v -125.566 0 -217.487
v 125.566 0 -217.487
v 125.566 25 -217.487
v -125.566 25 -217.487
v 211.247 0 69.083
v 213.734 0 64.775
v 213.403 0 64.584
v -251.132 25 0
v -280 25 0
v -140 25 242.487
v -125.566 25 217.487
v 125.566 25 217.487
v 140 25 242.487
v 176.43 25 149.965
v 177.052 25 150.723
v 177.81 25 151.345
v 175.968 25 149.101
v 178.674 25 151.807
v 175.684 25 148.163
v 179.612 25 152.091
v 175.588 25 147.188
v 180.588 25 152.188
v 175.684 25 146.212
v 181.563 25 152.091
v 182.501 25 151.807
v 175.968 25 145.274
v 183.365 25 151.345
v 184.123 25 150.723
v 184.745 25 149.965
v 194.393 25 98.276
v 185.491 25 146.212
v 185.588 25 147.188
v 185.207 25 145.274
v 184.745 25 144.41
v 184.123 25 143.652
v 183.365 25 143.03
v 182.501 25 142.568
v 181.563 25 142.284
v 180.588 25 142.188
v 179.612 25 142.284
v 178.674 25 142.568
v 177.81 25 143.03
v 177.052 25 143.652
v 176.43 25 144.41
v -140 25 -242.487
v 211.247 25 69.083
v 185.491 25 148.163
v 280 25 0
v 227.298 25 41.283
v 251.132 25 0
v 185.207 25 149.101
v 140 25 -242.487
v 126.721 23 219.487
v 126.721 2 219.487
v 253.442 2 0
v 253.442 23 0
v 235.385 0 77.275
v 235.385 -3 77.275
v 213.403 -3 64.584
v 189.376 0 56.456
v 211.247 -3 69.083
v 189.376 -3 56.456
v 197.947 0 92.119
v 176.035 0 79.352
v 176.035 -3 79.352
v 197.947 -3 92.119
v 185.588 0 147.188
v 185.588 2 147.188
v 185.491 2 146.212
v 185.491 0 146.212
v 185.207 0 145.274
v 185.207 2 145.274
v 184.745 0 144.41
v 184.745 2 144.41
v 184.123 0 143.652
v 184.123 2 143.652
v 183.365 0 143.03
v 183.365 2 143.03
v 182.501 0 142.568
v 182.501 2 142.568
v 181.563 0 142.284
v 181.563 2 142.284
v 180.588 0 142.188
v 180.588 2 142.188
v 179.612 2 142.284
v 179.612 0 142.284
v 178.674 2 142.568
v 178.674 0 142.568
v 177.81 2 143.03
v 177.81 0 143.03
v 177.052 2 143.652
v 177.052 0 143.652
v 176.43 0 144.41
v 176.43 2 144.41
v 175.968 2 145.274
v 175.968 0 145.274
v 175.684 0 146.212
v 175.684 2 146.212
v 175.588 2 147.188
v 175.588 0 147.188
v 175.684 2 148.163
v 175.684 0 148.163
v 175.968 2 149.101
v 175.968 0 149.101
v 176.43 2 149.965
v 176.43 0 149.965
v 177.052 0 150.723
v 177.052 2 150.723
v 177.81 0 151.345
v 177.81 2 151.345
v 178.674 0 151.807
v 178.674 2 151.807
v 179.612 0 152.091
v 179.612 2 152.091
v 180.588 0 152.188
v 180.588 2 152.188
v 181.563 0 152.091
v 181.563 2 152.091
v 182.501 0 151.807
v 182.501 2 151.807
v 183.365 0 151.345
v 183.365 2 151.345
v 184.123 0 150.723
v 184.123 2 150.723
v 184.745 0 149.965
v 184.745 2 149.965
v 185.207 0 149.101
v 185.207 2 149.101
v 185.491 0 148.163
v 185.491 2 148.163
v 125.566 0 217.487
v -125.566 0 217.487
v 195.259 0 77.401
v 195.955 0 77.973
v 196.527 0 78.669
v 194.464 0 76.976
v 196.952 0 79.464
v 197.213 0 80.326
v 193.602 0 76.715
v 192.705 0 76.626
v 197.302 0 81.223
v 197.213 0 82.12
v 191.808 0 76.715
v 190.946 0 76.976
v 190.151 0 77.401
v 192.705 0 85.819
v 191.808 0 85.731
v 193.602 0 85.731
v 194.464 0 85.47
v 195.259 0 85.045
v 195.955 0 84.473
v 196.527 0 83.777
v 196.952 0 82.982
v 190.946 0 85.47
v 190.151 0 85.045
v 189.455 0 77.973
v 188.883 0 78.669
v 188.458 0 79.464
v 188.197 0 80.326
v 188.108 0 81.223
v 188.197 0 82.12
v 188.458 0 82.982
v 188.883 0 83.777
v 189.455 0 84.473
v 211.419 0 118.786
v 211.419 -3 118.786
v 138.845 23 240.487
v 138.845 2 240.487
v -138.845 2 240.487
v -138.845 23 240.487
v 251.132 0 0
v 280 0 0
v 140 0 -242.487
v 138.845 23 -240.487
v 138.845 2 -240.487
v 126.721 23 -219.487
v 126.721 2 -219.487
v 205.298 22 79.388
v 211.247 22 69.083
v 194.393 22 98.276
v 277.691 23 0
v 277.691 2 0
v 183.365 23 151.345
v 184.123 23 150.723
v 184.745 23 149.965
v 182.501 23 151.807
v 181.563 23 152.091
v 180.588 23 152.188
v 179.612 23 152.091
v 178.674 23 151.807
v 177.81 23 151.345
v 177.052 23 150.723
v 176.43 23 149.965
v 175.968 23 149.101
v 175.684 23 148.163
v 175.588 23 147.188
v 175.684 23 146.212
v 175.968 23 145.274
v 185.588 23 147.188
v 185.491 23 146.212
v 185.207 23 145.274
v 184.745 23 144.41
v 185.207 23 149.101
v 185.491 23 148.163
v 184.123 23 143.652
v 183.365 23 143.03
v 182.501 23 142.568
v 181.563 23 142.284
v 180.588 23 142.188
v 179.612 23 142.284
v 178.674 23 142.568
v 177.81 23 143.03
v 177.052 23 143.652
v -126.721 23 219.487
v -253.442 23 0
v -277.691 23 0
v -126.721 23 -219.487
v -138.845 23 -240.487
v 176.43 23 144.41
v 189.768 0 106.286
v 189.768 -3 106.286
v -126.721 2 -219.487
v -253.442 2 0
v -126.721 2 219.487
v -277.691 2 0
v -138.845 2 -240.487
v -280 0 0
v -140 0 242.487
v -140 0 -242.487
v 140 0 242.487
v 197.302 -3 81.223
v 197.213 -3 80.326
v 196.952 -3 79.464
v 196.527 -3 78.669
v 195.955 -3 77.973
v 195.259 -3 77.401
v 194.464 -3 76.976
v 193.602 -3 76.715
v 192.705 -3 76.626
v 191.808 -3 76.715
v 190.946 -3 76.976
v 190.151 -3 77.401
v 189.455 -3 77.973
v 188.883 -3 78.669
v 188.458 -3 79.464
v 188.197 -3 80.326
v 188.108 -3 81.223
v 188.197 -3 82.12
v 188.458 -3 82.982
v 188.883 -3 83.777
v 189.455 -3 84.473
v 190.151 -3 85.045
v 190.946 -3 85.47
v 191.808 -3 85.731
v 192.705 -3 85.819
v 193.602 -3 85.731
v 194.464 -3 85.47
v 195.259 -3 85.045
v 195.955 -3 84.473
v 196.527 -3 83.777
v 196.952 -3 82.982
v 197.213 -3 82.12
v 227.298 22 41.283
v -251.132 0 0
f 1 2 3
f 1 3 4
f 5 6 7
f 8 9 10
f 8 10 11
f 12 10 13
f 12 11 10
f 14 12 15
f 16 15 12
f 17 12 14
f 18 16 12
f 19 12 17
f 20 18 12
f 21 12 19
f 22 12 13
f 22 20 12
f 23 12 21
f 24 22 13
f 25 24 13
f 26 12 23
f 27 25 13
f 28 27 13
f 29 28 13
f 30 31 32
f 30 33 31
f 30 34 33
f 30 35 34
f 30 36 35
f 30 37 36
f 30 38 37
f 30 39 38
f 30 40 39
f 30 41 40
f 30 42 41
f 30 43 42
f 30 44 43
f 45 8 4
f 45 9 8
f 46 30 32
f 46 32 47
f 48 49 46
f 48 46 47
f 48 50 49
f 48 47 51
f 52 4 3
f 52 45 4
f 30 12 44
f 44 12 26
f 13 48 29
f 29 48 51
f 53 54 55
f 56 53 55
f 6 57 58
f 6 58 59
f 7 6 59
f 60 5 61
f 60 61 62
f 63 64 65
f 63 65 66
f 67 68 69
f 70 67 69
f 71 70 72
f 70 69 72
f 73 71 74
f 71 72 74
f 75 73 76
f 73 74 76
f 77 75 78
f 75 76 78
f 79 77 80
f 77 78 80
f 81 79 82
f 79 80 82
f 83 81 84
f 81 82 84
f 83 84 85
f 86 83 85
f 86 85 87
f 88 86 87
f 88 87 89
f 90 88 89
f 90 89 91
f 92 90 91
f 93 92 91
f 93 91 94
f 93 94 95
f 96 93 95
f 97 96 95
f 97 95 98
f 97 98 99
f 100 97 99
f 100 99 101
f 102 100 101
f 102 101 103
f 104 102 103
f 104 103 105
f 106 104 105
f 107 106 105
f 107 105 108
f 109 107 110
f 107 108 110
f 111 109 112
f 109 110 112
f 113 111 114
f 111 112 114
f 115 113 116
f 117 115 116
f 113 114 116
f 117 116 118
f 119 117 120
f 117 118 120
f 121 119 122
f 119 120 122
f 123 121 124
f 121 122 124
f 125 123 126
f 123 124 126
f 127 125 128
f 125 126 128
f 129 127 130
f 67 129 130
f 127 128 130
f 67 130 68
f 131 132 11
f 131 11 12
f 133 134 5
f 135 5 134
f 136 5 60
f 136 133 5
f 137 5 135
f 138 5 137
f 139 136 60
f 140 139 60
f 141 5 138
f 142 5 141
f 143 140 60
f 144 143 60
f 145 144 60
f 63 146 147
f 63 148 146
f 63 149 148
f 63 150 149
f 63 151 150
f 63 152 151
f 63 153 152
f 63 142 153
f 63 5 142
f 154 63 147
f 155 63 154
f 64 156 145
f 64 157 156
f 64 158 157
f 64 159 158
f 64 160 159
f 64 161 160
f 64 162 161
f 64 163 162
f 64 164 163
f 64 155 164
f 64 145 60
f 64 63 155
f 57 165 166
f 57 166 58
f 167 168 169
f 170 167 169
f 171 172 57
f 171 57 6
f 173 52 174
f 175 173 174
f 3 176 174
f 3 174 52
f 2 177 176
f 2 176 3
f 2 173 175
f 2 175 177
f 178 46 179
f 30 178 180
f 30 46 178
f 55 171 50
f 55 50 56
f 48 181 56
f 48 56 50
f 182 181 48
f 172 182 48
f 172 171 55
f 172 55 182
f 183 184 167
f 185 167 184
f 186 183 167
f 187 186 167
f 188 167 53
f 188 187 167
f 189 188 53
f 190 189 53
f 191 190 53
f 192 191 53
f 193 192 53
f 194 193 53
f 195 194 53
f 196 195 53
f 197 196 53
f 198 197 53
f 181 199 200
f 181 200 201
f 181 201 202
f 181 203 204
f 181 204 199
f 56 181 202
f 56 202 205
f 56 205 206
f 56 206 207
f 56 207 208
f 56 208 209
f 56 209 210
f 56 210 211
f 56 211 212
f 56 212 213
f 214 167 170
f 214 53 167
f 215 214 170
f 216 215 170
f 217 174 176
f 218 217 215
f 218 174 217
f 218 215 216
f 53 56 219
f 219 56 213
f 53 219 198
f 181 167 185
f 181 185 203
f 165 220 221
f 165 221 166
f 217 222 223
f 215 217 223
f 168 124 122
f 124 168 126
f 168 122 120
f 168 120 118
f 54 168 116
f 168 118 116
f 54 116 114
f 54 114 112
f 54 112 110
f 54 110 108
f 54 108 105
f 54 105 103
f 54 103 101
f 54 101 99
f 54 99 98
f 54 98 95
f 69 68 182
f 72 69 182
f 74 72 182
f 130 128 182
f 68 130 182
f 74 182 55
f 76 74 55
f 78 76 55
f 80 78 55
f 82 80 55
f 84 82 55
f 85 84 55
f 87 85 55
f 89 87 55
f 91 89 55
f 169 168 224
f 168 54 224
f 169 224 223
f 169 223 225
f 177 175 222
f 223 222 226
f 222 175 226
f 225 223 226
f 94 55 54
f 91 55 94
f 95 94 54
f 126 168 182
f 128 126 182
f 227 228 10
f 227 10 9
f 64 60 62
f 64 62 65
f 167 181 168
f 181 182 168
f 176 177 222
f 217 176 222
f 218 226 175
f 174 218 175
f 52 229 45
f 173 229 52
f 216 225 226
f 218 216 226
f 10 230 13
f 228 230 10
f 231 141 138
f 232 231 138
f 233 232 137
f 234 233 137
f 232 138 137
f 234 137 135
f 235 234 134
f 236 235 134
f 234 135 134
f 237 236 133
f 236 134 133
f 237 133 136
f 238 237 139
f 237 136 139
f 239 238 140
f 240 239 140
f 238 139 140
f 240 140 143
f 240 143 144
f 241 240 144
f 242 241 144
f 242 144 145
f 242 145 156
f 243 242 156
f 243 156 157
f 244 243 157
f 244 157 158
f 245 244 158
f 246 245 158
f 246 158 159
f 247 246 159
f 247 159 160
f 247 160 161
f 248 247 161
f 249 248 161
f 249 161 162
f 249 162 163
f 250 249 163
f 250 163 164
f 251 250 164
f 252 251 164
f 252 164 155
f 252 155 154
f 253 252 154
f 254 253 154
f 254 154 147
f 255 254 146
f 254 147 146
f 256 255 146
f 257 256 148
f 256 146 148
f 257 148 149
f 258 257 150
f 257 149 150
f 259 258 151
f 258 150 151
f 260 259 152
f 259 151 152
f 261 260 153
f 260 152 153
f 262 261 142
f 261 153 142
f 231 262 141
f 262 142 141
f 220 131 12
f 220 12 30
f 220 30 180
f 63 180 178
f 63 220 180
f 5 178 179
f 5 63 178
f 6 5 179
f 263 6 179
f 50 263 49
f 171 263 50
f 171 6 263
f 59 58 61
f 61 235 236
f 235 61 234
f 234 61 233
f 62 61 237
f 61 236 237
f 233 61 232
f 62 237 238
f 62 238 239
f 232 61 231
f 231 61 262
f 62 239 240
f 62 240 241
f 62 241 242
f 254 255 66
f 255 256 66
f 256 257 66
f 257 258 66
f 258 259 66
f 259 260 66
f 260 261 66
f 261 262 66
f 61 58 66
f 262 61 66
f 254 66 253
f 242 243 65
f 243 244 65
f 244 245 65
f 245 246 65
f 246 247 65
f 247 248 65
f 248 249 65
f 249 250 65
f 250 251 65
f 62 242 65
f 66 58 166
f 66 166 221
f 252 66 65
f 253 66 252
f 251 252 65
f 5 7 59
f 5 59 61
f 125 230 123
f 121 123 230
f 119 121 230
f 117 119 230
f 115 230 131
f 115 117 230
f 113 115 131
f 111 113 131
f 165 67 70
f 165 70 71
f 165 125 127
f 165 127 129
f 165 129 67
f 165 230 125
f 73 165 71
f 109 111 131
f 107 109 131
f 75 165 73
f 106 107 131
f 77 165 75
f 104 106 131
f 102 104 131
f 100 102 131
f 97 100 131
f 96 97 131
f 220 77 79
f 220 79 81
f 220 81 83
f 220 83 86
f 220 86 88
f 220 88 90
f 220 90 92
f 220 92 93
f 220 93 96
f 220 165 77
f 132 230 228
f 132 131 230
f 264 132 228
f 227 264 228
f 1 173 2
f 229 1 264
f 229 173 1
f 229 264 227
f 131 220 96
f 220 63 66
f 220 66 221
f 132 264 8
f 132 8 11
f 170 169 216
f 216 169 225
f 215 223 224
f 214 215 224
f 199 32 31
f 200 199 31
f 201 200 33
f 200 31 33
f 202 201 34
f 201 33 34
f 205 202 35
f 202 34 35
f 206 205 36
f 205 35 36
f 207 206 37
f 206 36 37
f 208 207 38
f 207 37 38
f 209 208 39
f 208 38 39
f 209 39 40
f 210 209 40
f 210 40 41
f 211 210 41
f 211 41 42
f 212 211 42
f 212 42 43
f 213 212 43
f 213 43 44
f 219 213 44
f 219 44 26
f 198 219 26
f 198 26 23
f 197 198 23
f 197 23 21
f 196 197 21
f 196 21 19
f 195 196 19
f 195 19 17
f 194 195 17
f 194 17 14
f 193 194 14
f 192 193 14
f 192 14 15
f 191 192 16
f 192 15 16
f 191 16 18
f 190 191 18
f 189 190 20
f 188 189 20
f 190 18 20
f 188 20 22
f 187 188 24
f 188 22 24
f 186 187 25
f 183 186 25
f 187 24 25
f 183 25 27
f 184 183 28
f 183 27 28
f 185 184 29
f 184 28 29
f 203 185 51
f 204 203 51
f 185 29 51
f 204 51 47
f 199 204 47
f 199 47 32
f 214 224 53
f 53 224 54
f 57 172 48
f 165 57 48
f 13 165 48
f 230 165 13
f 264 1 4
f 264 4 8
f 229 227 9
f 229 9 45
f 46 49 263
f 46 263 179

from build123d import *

# Parameters (mm, degrees)
BOSS_EXTRUDE1_DEPTH = 25
SHELL1_T            = -2
SKETCH4_R           = 5
CUT_EXTRUDE2_DEPTH  = 40
SKETCH5_R           = 5.211475532
BOSS_EXTRUDE2_DEPTH = 3
CUT_EXTRUDE3_DEPTH  = 53
BOSS_EXTRUDE3_DEPTH = 3
SKETCH8_R           = 4.596631542
CUT_EXTRUDE4_DEPTH  = 3
BOSS_EXTRUDE4_DEPTH = 3
CUT_EXTRUDE5_DEPTH  = 3
CUT_EXTRUDE6_DEPTH  = 3
CUT_EXTRUDE7_DEPTH  = 3
BOSS_EXTRUDE5_DEPTH = 3
SKETCH14_R          = 4.596631542
CUT_EXTRUDE8_DEPTH  = 23
CUT_EXTRUDE10_DEPTH = 23


with BuildPart() as part:
    # Sketch1 → Boss-Extrude1 (new body)
    with BuildSketch(Plane(origin=(0, 0, 0), x_dir=(1, 0, 0), z_dir=(0, 1, 0))):
        Polygon((125.56624327, 217.48711306), (-125.56624327, 217.48711306), (-251.132486541, 0), (-125.56624327, -217.48711306), (125.56624327, -217.48711306), (251.132486541, 0), (280, 0), (140, -242.48711306), (-140, -242.48711306), (-280, 0), (-140, 242.48711306), (140, 242.48711306), align=None)
    extrude(amount=BOSS_EXTRUDE1_DEPTH)

    # Shell1
    shell1_openings = [part.faces().sort_by_distance(p)[0] for p in [
        (265.56624327, 12.5, 0),
        (132.783121635, 12.5, -229.98711306),
    ]]
    offset(amount=SHELL1_T, openings=shell1_openings, kind=Kind.INTERSECTION)

    # Sketch4 → Cut-Extrude2 (cut)
    with BuildSketch(Plane(origin=(0, 25, 0), x_dir=(1, 0, 0), z_dir=(0, 1, 0))):
        with Locations((180.587500524, -147.1875)):
            Circle(SKETCH4_R)
    extrude(amount=-CUT_EXTRUDE2_DEPTH, mode=Mode.SUBTRACT)

    # Sketch5 → Boss-Extrude2 (add)
    with BuildSketch(Plane(origin=(0, 25, 0), x_dir=(1, 0, 0), z_dir=(0, 1, 0))):
        Polygon((201.132486541, -86.602540378), (159.222437422, -159.192874799), (98.600659157, -124.192874799), (140.510708276, -51.602540378), align=None)
        with Locations((121.228675973, -125)):
            Circle(SKETCH5_R, mode=Mode.SUBTRACT)
    extrude(amount=-BOSS_EXTRUDE2_DEPTH)

    # Sketch6 → Cut-Extrude3 (cut)
    with BuildSketch(Plane(origin=(0, 25, 0), x_dir=(1, 0, 0), z_dir=(0, 1, 0))):
        Polygon((140.510708276, -51.602540378), (201.132486541, -86.602540378), (158.682929972, -160.127329114), (98.061151707, -125.127329114), align=None)
    extrude(amount=-CUT_EXTRUDE3_DEPTH, mode=Mode.SUBTRACT)

    # Sketch7 → Boss-Extrude3 (add)
    with BuildSketch(Plane(origin=(0, 25, 0), x_dir=(1, 0, 0), z_dir=(0, 1, 0))):
        Polygon((227.297559203, -41.283305143), (205.297559203, -79.388422909), (149.005907957, -46.888422909), (171.005907957, -8.783305143), align=None)
    extrude(amount=-BOSS_EXTRUDE3_DEPTH)

    # Sketch8 → Cut-Extrude4 (cut)
    with BuildSketch(Plane(origin=(0, 25, 0), x_dir=(1, 0, 0), z_dir=(0, 1, 0))):
        with Locations((196.32303906, -78.932747771)):
            Circle(SKETCH8_R)
    extrude(amount=-CUT_EXTRUDE4_DEPTH, mode=Mode.SUBTRACT)

    # Sketch9 → Boss-Extrude4 (add)
    with BuildSketch(Plane(origin=(0, 25, 0), x_dir=(1, 0, 0), z_dir=(0, 1, 0))):
        with BuildLine():
            Line((205.297559203, -79.388422909), (200.181682496, -76.434770115))
            ThreePointArc((200.181682496, -76.434770115), (194.024723289, -82.913547458), (196.55702945, -74.342075704))
            Line((196.55702945, -74.342075704), (149.005907957, -46.888422909))
            Line((149.005907957, -46.888422909), (138.101240513, -65.775860963))
            Line((138.101240513, -65.775860963), (194.392891759, -98.275860963))
            Line((194.392891759, -98.275860963), (205.297559203, -79.388422909))
        make_face()
    extrude(amount=-BOSS_EXTRUDE4_DEPTH)

    # Sketch10 → Cut-Extrude5 (cut)
    with BuildSketch(Plane(origin=(0, 25, 0), x_dir=(1, 0, 0), z_dir=(0, 1, 0))):
        Polygon((171.005907957, -8.783305143), (227.297559203, -41.283305143), (211.247303055, -69.083164267), (154.955651809, -36.583164267), align=None)
    extrude(amount=-CUT_EXTRUDE5_DEPTH, mode=Mode.SUBTRACT)

    # Sketch11 → Cut-Extrude6 (cut)
    with BuildSketch(Plane(origin=(0, 25, 0), x_dir=(1, 0, 0), z_dir=(0, 1, 0))):
        Polygon((154.955651809, -36.583164267), (189.376099165, -56.455818813), (172.628994903, -85.462654274), (138.208547547, -65.589999728), align=None)
    extrude(amount=-CUT_EXTRUDE6_DEPTH, mode=Mode.SUBTRACT)

    # Sketch12 → Cut-Extrude7 (cut)
    with BuildSketch(Plane(origin=(0, 25, 0), x_dir=(1, 0, 0), z_dir=(0, 1, 0))):
        Polygon((133.472959546, -64.327583033), (137.505827692, -57.317833183), (175.943359627, -79.431817482), (171.910491481, -86.441567333), align=None)
    extrude(amount=-CUT_EXTRUDE7_DEPTH, mode=Mode.SUBTRACT)

    # Sketch13 → Boss-Extrude5 (add)
    with BuildSketch(Plane.XZ):
        Polygon((197.947448943, 92.119187322), (189.768280461, 106.285922696), (211.418915556, 118.785922696), (235.385066588, 77.275331446), (213.403041068, 64.584003094), (211.247303055, 69.083164267), (189.376099165, 56.455818813), (176.035335717, 79.351557189), align=None)
    extrude(amount=BOSS_EXTRUDE5_DEPTH)

    # Sketch14 → Cut-Extrude8 (cut)
    with BuildSketch(Plane(origin=(0, 0, 0), x_dir=(1, 0, 0), z_dir=(0, 1, 0))):
        with Locations((192.705001821, -81.222810357)):
            Circle(SKETCH14_R)
    extrude(amount=-CUT_EXTRUDE8_DEPTH, mode=Mode.SUBTRACT)

    # Sketch15 → Cut-Extrude10 (cut)
    with BuildSketch(Plane(origin=(0, 25, 0), x_dir=(1, 0, 0), z_dir=(0, 1, 0))):
        Polygon((187.452678382, -55.345331307), (211.247303055, -69.083164267), (194.392891759, -98.275860963), (170.321525229, -84.378251017), align=None)
    extrude(amount=-CUT_EXTRUDE10_DEPTH, mode=Mode.SUBTRACT)


solid = part.part
